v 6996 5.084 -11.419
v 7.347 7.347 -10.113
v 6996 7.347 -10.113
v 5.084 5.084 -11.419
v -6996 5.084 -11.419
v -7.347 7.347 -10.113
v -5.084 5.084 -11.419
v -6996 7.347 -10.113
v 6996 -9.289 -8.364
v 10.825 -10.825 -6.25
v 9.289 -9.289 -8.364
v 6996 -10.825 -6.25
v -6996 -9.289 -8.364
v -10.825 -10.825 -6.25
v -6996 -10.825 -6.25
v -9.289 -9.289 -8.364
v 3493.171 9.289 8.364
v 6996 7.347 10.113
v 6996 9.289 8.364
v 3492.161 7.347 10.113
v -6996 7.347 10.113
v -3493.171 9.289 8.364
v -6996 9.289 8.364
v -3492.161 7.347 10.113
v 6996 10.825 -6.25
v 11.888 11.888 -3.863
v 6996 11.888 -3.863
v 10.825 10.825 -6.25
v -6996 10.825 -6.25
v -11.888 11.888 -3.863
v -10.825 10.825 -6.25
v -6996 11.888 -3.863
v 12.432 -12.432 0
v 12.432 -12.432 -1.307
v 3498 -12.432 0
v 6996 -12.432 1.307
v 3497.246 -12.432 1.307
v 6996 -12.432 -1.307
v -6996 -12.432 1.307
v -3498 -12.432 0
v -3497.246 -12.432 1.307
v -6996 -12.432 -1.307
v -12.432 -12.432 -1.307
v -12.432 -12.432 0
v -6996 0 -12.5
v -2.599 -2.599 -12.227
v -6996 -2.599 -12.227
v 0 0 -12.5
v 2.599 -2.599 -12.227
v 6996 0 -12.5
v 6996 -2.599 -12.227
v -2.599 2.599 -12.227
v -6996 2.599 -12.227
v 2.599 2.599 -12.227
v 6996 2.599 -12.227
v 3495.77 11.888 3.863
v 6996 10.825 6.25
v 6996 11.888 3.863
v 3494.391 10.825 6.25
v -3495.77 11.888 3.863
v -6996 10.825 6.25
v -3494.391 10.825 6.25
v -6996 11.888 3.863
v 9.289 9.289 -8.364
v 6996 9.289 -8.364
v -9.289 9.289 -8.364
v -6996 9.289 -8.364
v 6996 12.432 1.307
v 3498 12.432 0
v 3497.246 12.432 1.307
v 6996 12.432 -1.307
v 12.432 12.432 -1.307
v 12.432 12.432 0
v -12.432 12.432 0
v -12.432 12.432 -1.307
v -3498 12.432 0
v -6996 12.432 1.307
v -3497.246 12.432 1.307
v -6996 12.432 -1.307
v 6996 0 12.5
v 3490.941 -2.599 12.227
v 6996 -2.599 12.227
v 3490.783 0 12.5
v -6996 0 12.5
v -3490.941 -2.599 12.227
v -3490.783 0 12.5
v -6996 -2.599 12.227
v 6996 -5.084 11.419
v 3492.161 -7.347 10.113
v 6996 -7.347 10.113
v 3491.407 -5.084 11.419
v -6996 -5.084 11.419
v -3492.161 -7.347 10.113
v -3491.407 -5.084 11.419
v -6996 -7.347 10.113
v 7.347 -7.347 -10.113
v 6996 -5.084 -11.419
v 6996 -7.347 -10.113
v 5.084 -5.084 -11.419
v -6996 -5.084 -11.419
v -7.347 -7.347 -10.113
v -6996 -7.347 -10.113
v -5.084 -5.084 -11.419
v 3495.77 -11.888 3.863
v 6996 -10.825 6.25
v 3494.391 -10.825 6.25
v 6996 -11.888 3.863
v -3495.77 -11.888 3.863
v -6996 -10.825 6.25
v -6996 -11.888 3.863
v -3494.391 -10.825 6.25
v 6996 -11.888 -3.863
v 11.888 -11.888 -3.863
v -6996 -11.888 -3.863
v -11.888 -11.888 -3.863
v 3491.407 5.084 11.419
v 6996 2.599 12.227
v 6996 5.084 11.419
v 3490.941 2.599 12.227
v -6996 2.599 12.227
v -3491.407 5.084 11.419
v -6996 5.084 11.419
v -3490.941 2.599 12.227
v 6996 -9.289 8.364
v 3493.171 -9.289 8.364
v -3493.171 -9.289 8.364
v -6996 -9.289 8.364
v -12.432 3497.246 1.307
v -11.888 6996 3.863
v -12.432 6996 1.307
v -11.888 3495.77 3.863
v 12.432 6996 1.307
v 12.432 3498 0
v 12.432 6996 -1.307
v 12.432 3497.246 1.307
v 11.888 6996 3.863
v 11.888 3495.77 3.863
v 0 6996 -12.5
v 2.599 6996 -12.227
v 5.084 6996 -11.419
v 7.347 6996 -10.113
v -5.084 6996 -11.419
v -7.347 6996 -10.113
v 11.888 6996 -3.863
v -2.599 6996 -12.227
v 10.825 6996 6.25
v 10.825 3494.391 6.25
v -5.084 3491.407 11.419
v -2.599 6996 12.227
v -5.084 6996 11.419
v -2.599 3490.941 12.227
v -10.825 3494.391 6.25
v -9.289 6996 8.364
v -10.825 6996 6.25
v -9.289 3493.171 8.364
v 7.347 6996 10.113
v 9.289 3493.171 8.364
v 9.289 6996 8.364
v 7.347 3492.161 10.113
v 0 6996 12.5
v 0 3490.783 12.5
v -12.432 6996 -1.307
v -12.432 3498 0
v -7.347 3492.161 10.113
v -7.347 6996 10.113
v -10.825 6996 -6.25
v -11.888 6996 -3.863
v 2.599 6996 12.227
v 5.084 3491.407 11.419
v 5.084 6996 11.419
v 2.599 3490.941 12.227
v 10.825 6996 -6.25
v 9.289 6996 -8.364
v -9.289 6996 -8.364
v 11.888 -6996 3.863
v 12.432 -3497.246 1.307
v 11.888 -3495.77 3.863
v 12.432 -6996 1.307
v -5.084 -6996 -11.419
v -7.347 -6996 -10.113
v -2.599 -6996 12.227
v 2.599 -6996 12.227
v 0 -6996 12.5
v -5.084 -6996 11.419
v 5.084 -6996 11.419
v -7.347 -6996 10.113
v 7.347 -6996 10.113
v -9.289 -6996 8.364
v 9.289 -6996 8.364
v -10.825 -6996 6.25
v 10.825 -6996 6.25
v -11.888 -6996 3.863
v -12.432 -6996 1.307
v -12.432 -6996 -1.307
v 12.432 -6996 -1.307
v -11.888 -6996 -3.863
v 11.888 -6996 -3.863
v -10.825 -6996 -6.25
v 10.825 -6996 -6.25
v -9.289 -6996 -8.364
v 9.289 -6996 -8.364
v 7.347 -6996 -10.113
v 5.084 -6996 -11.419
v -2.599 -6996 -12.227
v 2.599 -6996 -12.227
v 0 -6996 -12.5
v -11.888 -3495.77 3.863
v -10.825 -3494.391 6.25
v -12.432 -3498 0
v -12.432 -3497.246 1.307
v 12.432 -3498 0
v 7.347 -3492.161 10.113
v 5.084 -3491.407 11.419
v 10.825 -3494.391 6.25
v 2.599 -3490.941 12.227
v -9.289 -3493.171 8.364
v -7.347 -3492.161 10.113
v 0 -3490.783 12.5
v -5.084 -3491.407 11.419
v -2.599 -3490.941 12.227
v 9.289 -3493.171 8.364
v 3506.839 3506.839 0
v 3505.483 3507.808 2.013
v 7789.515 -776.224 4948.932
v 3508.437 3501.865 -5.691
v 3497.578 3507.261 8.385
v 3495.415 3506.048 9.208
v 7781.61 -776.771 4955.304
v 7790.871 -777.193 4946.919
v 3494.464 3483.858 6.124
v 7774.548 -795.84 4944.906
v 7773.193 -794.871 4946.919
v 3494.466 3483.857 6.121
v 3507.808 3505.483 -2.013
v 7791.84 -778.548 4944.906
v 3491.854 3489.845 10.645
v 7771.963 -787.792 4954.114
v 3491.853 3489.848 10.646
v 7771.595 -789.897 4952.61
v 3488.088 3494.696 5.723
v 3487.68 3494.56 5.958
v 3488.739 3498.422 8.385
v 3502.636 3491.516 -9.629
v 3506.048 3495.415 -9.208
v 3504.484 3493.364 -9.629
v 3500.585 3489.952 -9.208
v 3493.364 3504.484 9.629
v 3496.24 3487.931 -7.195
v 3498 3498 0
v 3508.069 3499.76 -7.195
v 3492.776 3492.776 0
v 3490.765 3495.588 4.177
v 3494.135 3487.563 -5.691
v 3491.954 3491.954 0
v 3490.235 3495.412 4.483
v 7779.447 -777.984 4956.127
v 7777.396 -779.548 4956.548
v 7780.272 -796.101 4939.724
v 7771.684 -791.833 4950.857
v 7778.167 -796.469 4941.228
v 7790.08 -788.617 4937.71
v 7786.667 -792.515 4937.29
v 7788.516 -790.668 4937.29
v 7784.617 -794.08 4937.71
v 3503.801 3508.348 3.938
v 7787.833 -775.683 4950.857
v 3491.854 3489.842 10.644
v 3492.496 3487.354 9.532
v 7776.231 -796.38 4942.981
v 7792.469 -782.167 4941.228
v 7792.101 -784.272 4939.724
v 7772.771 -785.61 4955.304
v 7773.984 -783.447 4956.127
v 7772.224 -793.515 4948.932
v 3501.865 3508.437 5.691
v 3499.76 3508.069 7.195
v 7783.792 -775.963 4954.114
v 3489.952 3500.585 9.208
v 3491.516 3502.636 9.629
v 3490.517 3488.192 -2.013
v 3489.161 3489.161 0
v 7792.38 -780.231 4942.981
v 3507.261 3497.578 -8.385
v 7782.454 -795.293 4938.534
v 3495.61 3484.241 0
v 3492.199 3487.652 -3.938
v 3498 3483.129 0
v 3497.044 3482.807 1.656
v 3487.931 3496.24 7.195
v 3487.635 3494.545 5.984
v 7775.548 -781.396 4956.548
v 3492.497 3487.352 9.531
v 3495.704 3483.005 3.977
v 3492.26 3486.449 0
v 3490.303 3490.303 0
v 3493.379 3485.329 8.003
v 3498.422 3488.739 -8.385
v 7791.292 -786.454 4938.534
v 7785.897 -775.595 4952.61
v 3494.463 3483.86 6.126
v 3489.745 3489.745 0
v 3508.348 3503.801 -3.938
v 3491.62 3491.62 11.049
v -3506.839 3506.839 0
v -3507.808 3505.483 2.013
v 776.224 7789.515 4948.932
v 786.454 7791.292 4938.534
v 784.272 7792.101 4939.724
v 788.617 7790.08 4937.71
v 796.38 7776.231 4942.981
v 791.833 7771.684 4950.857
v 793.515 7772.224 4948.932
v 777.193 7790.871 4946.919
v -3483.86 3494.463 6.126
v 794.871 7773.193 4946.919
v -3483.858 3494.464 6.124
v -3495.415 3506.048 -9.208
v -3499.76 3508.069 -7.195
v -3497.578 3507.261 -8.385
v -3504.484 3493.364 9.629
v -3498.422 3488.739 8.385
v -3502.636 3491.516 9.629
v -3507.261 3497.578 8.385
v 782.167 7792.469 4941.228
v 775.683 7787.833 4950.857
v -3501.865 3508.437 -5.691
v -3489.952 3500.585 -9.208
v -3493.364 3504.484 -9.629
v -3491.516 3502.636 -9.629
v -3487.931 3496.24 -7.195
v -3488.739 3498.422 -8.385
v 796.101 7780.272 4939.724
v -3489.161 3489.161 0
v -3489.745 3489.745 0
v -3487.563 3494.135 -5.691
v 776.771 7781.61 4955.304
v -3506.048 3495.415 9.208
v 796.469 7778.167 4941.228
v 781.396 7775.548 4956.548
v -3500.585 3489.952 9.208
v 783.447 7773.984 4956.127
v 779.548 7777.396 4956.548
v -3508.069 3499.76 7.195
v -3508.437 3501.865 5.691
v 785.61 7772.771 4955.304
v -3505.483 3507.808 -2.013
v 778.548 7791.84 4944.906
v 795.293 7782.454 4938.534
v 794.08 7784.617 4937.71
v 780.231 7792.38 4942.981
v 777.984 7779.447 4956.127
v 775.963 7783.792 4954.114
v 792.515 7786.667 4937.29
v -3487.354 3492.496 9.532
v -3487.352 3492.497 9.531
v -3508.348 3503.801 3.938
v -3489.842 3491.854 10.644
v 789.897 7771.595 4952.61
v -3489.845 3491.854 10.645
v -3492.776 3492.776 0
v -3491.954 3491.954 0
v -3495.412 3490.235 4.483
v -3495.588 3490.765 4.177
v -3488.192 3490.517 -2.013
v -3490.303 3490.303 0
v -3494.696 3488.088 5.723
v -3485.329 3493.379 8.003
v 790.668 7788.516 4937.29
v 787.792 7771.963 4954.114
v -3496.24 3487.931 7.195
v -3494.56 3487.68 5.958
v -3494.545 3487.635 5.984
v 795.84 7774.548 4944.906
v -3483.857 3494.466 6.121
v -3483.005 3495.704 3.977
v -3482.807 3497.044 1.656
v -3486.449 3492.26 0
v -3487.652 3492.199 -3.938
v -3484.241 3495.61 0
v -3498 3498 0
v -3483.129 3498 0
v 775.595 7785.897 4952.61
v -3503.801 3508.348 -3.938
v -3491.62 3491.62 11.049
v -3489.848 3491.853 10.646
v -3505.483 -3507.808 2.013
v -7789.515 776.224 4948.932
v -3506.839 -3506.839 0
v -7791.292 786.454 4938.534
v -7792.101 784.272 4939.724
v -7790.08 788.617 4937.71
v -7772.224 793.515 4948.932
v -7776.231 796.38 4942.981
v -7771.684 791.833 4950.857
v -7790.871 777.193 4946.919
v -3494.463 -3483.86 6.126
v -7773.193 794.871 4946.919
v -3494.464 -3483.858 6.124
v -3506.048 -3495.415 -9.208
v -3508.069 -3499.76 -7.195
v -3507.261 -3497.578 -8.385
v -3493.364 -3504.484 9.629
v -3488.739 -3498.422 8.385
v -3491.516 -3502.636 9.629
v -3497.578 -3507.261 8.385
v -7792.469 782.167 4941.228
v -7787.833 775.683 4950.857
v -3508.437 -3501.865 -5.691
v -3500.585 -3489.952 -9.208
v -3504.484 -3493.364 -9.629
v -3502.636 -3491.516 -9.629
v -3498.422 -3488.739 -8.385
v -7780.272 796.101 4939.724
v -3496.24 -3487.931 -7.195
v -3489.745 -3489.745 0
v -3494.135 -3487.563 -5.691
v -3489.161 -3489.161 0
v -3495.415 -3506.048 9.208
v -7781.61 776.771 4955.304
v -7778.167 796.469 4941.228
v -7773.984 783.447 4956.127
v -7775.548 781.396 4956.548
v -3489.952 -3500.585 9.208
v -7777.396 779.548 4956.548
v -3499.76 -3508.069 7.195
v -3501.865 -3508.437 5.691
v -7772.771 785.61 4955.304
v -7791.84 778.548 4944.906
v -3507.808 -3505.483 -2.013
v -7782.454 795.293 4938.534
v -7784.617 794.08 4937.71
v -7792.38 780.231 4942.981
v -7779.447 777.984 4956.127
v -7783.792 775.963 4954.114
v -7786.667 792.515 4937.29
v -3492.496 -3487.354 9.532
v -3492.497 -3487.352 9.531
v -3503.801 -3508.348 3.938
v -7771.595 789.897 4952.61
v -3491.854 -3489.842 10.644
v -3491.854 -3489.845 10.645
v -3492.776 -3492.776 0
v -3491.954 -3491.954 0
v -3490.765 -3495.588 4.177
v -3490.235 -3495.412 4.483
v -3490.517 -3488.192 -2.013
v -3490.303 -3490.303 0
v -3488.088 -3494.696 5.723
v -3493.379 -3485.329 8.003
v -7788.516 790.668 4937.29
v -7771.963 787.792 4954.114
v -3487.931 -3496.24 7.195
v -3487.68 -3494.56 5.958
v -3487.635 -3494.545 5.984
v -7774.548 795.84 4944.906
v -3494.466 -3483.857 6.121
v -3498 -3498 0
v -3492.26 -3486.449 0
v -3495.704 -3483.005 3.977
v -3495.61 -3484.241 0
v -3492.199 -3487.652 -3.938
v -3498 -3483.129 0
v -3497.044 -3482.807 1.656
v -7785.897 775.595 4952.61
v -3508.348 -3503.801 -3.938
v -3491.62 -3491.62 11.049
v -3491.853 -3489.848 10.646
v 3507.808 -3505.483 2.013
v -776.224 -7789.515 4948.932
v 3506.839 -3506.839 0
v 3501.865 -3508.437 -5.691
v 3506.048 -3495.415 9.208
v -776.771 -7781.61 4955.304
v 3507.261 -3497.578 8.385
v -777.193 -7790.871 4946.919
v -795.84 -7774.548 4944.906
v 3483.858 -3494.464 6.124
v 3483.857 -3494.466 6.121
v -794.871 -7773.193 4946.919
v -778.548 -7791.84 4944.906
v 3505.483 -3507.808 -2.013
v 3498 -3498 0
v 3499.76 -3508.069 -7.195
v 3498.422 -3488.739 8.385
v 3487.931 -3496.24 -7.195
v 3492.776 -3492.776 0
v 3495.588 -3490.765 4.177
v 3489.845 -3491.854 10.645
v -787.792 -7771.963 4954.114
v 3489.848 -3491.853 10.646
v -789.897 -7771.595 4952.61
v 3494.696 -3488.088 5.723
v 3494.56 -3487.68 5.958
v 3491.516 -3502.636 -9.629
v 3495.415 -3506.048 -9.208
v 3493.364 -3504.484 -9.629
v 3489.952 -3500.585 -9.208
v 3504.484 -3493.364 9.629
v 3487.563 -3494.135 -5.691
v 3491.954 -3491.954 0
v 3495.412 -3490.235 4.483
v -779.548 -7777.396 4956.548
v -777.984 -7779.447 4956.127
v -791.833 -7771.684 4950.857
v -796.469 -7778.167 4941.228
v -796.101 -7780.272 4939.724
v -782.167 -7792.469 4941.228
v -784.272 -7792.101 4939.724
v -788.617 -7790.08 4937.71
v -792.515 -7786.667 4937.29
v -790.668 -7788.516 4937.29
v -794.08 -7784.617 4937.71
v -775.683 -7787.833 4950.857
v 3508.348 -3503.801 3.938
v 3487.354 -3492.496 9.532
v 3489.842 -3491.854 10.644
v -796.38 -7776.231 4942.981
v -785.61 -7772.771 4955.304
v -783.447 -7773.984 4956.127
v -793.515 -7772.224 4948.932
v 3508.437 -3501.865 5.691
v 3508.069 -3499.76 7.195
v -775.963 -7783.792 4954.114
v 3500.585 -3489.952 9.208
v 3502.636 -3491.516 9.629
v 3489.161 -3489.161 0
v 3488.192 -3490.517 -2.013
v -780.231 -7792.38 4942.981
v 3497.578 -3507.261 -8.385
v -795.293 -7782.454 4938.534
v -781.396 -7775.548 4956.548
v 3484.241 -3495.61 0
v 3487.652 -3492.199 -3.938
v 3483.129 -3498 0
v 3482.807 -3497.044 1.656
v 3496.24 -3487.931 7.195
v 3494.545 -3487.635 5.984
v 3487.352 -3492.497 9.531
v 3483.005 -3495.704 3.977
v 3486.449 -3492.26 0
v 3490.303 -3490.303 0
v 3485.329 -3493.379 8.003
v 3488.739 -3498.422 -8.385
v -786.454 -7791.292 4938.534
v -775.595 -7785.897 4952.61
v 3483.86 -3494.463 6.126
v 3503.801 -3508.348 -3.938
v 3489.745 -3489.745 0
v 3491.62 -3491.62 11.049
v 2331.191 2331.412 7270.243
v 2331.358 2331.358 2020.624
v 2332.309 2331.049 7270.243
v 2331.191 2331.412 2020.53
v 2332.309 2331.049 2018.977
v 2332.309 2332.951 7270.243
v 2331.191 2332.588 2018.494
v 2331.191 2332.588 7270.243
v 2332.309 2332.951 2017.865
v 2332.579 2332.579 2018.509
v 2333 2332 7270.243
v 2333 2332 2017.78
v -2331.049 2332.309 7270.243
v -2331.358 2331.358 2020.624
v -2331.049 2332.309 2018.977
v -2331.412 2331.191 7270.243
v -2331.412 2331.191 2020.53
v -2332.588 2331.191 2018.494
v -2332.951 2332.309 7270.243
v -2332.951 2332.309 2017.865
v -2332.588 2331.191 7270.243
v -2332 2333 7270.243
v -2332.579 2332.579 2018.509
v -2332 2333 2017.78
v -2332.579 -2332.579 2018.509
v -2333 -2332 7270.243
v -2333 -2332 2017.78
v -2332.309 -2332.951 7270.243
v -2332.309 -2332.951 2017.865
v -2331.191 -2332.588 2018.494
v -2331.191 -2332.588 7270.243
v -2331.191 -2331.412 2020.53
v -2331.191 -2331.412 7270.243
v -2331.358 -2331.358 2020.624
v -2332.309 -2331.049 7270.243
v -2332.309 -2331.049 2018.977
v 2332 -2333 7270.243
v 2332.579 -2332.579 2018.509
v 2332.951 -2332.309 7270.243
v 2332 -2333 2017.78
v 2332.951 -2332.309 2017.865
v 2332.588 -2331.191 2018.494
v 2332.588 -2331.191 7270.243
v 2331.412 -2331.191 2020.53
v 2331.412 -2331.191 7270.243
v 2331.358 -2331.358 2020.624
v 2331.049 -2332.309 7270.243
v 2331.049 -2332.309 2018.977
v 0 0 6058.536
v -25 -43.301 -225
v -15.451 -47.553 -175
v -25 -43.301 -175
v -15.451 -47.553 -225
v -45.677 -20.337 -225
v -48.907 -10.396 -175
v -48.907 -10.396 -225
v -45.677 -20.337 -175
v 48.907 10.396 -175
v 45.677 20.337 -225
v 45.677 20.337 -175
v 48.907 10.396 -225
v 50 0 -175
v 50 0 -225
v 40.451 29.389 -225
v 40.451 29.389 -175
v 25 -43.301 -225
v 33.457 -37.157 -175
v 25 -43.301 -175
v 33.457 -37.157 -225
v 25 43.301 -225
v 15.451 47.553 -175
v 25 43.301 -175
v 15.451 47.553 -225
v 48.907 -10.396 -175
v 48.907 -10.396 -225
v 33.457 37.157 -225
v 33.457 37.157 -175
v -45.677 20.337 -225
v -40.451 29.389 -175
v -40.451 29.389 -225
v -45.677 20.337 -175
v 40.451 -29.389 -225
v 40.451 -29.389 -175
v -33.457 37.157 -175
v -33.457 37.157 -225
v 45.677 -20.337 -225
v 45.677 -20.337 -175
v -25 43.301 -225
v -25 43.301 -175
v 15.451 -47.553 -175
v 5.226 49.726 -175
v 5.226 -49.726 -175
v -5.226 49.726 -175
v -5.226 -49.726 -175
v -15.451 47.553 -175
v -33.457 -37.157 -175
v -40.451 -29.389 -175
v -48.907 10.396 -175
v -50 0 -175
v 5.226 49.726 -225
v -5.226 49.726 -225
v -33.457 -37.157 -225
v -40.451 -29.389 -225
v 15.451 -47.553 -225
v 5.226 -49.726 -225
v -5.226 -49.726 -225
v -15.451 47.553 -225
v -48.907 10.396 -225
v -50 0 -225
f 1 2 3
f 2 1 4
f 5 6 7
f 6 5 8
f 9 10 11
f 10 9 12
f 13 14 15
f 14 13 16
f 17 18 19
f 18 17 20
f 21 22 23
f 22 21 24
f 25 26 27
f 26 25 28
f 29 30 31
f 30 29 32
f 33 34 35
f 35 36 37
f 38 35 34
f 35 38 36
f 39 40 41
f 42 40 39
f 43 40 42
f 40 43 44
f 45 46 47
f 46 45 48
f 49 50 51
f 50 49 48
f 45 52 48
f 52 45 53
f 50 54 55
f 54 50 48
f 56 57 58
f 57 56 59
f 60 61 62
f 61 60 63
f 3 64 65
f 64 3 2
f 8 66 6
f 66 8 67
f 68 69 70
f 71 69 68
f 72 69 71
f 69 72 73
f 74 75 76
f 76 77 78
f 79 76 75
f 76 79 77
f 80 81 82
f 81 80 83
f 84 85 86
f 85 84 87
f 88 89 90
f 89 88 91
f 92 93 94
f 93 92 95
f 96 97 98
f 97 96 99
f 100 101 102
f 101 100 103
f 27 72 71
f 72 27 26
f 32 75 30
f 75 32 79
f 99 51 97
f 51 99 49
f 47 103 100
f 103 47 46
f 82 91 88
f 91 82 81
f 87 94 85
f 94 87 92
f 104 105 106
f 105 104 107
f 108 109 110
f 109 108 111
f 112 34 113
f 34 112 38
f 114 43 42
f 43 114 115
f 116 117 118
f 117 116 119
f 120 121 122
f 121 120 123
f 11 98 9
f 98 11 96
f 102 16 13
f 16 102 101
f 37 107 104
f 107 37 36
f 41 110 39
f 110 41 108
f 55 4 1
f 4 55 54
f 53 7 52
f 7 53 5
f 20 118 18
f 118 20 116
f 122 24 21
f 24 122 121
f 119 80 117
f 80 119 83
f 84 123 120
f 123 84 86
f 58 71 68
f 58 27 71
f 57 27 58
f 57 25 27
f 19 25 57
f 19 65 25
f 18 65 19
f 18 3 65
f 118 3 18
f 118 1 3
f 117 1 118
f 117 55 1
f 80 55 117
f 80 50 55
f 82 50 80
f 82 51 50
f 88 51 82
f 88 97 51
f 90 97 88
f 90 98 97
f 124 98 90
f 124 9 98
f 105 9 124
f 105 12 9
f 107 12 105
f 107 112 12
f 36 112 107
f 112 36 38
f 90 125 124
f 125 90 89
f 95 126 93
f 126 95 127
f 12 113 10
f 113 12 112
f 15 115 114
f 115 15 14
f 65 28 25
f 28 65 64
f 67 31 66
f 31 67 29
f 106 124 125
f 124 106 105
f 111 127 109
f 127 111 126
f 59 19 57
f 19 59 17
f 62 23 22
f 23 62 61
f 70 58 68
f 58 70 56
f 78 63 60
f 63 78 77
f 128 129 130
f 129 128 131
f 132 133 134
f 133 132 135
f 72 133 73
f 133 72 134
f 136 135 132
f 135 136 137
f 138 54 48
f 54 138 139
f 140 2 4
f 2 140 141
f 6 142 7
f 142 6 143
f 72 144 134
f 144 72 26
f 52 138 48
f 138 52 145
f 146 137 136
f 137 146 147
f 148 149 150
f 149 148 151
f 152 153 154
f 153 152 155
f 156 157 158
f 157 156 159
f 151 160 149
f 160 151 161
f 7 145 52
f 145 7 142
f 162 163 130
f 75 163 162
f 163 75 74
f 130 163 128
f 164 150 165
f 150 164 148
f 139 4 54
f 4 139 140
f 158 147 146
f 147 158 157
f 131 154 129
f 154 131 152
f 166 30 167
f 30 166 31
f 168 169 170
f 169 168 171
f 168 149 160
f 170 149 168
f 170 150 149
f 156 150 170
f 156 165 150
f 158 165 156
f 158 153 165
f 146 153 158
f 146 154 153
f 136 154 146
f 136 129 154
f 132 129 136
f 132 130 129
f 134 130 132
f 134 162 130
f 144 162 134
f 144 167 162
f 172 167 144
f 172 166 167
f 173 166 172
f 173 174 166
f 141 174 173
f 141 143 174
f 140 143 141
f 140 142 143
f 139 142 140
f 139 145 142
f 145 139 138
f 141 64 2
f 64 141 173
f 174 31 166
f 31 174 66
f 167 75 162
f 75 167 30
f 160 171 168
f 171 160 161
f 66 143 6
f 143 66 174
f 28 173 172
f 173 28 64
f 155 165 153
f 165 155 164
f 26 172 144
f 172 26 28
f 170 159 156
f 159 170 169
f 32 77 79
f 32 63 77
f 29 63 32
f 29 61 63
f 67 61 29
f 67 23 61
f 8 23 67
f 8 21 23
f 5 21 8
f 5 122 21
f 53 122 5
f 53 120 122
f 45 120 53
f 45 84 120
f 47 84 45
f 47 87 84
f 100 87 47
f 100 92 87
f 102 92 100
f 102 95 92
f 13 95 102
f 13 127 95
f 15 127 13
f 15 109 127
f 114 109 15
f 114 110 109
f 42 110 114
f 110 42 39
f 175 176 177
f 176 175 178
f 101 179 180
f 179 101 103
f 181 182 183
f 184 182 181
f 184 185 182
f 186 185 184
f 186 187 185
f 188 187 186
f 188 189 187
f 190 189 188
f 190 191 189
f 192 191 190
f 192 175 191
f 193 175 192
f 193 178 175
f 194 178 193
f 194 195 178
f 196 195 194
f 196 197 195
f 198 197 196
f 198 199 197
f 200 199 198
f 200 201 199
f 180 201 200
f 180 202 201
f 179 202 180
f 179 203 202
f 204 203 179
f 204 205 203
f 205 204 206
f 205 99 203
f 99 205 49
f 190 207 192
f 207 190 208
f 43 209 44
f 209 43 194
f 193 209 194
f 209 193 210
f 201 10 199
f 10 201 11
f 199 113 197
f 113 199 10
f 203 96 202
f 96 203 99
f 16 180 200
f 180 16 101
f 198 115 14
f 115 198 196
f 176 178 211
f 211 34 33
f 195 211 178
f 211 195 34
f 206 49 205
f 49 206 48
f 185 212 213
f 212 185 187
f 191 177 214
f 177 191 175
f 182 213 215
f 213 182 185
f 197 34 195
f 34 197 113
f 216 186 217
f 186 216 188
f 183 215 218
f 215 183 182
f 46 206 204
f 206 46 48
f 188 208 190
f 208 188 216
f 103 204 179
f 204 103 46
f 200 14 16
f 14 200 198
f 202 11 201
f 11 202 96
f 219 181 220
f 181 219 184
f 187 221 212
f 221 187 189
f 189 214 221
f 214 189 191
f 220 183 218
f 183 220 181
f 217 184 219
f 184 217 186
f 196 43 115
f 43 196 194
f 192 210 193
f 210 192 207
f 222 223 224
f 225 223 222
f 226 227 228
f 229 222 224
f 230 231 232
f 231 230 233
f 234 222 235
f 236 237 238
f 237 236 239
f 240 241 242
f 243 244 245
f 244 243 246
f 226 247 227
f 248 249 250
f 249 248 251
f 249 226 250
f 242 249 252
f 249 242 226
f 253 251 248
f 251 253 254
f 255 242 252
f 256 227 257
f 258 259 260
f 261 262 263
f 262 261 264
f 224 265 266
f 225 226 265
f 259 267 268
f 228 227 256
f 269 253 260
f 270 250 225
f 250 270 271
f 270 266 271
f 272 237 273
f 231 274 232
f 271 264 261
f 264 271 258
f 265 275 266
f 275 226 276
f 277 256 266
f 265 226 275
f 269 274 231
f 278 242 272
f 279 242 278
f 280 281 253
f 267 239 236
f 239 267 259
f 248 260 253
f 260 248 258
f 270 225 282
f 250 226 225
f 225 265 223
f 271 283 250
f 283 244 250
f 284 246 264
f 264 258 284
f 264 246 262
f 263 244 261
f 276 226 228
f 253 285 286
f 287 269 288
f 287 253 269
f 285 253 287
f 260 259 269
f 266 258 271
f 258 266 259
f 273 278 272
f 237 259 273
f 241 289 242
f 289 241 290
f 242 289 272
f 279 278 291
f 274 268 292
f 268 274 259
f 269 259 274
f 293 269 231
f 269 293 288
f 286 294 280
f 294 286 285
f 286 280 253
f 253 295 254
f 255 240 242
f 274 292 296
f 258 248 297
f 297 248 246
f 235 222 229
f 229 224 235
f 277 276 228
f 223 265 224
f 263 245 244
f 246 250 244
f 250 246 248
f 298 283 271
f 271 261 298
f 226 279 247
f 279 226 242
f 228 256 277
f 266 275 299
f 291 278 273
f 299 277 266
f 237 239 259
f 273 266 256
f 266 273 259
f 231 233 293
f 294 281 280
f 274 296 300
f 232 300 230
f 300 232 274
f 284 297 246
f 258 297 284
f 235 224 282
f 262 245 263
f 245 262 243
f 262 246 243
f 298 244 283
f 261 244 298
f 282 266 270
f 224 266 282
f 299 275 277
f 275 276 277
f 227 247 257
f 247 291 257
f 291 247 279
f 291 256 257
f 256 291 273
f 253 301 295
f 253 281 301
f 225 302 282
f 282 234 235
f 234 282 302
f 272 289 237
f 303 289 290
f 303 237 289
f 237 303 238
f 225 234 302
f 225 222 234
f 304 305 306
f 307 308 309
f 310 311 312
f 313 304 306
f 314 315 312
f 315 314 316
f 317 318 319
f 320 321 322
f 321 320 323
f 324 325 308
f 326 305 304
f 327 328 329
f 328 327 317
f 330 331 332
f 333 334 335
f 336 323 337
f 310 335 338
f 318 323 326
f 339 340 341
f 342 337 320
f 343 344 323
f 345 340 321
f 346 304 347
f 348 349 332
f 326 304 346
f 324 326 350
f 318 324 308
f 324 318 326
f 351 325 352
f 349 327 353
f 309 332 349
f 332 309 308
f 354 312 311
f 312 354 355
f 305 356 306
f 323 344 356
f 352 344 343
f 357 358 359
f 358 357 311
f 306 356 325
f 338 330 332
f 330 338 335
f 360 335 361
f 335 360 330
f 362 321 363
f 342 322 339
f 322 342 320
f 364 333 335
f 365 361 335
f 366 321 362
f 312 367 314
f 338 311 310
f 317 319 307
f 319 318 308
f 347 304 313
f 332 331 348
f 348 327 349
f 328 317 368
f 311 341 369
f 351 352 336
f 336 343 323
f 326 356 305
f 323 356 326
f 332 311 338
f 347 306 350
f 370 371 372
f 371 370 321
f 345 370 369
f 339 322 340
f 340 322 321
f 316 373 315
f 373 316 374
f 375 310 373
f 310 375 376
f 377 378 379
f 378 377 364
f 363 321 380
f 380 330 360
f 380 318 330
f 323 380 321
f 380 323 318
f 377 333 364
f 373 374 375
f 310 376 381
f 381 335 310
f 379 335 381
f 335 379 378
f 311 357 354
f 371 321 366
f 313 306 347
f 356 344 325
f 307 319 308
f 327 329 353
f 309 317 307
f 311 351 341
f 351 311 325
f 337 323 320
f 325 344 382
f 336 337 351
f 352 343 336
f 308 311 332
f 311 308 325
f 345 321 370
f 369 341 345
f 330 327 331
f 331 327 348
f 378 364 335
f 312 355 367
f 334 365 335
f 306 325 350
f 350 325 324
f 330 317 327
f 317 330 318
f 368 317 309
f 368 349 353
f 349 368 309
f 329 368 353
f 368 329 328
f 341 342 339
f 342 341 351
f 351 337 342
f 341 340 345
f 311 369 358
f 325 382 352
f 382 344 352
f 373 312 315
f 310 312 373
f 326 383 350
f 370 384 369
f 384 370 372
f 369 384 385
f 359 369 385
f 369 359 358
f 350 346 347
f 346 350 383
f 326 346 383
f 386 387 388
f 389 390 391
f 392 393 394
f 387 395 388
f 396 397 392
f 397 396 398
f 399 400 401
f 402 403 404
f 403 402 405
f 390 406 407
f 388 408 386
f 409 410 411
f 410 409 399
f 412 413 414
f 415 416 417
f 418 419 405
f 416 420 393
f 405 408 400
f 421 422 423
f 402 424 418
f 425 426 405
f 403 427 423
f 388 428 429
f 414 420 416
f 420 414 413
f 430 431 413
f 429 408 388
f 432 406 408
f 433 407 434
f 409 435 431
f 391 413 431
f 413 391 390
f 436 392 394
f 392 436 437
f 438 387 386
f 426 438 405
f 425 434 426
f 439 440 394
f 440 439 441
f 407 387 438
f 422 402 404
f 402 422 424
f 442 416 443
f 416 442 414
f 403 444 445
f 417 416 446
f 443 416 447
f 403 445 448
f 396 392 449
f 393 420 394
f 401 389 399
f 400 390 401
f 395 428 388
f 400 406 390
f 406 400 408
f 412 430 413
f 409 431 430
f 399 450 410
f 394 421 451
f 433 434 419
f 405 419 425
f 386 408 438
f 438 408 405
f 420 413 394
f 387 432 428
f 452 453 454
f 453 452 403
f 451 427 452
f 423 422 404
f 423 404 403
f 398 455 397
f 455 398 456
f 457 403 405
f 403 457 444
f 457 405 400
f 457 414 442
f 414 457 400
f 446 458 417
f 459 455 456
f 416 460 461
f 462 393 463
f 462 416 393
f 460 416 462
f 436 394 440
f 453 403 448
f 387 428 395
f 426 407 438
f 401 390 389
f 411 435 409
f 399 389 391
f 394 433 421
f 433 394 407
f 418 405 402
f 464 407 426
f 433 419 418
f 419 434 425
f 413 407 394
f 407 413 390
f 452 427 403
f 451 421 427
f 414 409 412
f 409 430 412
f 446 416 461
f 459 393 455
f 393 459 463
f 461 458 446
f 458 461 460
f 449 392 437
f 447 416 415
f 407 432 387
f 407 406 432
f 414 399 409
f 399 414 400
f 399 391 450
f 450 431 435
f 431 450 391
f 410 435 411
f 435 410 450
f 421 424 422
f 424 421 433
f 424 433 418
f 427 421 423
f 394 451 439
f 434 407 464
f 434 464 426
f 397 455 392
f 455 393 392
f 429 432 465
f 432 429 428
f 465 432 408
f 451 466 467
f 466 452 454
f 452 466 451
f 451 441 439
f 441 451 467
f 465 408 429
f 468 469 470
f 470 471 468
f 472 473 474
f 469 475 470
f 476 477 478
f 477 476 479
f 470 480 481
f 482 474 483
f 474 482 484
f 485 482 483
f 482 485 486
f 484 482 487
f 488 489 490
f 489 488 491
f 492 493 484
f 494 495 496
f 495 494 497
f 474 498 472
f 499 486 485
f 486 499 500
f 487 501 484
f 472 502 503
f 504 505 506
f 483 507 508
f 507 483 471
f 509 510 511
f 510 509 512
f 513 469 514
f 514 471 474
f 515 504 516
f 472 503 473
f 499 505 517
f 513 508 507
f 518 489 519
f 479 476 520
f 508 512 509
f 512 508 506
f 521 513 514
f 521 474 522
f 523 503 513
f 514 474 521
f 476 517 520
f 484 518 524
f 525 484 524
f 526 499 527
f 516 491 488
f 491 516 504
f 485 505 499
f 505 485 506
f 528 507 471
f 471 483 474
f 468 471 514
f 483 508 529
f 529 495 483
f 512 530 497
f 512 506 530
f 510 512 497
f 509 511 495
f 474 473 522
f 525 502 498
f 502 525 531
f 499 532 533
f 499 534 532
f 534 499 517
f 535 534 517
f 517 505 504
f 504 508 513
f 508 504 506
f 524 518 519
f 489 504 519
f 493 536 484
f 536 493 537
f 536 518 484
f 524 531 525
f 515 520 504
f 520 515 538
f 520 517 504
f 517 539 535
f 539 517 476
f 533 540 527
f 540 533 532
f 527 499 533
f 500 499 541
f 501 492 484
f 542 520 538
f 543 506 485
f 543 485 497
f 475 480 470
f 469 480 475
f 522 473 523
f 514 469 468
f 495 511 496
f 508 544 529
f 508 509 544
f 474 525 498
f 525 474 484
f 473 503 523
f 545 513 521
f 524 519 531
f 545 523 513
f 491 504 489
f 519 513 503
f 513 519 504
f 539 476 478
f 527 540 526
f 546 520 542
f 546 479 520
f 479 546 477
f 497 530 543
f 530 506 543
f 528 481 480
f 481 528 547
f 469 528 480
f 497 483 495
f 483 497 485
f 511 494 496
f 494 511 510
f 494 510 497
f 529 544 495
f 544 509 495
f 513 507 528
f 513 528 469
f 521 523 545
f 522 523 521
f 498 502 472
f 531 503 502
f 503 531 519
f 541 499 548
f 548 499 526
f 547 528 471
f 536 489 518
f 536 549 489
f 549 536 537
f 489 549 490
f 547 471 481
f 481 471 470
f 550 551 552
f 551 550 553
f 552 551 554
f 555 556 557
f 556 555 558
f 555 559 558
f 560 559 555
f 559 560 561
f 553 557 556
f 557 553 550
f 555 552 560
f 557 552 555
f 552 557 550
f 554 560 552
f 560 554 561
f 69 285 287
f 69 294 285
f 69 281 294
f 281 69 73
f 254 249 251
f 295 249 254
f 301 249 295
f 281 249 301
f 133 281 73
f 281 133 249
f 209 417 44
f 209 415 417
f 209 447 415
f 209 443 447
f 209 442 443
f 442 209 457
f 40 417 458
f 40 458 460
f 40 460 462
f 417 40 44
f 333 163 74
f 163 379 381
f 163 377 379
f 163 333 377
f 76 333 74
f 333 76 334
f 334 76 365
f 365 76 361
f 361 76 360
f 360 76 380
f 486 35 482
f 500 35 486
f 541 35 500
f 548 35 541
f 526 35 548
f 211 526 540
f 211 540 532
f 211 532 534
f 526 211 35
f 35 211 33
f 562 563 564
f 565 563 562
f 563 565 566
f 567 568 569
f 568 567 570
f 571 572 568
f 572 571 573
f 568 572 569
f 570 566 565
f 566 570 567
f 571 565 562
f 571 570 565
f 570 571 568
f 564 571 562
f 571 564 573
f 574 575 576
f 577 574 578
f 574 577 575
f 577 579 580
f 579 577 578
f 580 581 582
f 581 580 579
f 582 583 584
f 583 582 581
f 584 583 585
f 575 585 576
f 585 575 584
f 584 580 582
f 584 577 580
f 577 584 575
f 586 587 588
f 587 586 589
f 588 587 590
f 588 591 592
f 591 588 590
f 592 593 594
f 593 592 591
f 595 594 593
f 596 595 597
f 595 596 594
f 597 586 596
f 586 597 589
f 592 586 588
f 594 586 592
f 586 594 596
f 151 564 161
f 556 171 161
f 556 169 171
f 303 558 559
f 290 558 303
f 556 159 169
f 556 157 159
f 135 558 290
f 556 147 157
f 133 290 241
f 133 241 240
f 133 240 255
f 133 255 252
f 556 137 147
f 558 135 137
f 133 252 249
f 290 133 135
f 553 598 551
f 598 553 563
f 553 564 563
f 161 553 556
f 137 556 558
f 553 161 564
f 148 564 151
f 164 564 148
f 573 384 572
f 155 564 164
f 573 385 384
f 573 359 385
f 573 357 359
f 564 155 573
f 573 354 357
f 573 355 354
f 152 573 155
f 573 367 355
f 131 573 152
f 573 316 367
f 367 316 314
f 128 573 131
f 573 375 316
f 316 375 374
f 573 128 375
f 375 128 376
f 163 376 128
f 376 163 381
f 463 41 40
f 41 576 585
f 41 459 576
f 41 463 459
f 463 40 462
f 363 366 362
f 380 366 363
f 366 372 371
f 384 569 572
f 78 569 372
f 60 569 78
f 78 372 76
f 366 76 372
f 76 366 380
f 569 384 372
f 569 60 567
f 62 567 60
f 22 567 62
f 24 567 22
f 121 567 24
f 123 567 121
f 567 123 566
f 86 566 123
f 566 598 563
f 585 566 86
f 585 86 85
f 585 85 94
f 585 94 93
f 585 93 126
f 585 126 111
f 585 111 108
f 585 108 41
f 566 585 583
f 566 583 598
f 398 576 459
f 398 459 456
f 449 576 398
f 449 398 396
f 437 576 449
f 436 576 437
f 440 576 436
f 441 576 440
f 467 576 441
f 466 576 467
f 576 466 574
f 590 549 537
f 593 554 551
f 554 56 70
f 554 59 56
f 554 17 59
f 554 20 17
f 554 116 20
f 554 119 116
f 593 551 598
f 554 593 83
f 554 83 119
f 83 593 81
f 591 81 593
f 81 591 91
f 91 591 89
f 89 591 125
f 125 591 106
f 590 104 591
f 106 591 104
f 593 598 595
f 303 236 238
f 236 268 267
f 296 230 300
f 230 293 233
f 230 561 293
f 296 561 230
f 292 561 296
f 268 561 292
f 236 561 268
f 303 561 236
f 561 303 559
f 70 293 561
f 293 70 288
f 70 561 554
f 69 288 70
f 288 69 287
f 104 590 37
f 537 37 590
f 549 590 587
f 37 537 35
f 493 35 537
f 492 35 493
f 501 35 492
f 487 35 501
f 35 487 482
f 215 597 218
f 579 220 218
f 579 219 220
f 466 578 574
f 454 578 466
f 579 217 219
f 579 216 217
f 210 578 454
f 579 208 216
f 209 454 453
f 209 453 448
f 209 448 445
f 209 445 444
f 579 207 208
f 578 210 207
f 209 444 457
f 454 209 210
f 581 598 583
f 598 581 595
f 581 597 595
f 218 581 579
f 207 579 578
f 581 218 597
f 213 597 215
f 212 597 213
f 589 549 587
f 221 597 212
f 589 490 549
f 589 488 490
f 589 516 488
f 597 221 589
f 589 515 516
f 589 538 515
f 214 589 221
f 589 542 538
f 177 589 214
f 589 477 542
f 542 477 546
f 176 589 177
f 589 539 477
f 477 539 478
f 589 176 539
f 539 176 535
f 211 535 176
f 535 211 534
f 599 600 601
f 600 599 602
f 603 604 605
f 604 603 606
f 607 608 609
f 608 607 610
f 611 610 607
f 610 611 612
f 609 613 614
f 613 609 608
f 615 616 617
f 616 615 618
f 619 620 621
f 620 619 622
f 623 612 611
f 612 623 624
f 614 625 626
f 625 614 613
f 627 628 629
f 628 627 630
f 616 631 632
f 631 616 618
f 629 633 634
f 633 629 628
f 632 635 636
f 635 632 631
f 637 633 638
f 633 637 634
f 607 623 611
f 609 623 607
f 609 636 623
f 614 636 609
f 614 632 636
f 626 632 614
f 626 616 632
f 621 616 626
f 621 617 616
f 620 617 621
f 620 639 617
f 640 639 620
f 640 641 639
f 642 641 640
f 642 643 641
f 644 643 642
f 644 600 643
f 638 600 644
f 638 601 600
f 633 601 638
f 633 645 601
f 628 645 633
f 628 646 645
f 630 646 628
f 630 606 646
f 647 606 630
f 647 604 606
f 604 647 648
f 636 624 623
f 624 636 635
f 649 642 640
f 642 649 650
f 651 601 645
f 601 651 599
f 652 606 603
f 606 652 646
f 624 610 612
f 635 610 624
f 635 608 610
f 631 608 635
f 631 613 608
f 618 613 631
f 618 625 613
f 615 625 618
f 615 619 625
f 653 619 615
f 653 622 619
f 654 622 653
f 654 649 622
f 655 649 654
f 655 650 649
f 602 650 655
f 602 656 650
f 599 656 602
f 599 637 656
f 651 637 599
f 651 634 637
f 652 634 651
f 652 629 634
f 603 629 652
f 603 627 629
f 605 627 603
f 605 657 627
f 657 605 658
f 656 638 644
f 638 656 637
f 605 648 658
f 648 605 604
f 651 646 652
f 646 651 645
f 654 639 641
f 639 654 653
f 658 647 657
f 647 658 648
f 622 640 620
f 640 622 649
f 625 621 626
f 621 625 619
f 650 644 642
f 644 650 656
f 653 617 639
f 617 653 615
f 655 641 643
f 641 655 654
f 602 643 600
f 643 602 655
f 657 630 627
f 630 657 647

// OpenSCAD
// da Vinci Pyramid Parachute - Parametric Model
// Based on Codex Atlanticus folio 381v

// Parameters
size = 6996.0;  // Convert to mm
frame_diameter = 25;    // Frame pole diameter in mm
canopy_thickness = 0.5; // Canopy material thickness in mm

// Calculate pyramid height (equilateral triangles)
pyramid_height = size * 0.866;

module pyramid_frame() {
    // Base square frame
    color("brown", 0.8)
    union() {
        // Four base edges
        for (i = [0:3]) {
            rotate([0, 0, i*90])
            translate([size/2, 0, 0])
            rotate([0, 90, 0])
            cylinder(h=size, d=frame_diameter, center=true);
        }

        // Four apex edges
        for (i = [0:3]) {
            rotate([0, 0, i*90])
            translate([size/2, size/2, 0])
            rotate([atan(pyramid_height/(size/sqrt(2))), 0, 45])
            cylinder(h=sqrt(pow(size/sqrt(2), 2) + pow(pyramid_height, 2)), d=frame_diameter);
        }
    }
}

module canopy() {
    // Pyramid canopy (simplified as solid for visualization)
    color("lightblue", 0.7)
    translate([0, 0, pyramid_height/2])
    scale([1, 1, pyramid_height/(size/2)])
    rotate([0, 0, 45])
    cylinder(h=size/2, d1=size*sqrt(2), d2=0, center=true, $fn=4);
}

module suspension_lines() {
    // Simplified suspension lines from apex to payload
    color("gray", 0.5)
    for (i = [0:3]) {
        rotate([0, 0, i*90])
        translate([size/3, size/3, 0])
        cylinder(h=pyramid_height*1.2, d=2);
    }
}

module payload_harness() {
    // Simplified payload attachment point
    color("darkgray")
    translate([0, 0, -200])
    cylinder(h=50, d=100, center=true);
}

// Assembly
pyramid_frame();
canopy();
suspension_lines();
payload_harness();

// Export note
echo(str("Parachute size: ", size/1000, " meters"));
echo(str("Pyramid height: ", pyramid_height/1000, " meters"));
echo(str("Estimated canopy area: ", 2*size*sqrt(pow(size/2,2)+pow(pyramid_height,2))/1000000, " m²"));
